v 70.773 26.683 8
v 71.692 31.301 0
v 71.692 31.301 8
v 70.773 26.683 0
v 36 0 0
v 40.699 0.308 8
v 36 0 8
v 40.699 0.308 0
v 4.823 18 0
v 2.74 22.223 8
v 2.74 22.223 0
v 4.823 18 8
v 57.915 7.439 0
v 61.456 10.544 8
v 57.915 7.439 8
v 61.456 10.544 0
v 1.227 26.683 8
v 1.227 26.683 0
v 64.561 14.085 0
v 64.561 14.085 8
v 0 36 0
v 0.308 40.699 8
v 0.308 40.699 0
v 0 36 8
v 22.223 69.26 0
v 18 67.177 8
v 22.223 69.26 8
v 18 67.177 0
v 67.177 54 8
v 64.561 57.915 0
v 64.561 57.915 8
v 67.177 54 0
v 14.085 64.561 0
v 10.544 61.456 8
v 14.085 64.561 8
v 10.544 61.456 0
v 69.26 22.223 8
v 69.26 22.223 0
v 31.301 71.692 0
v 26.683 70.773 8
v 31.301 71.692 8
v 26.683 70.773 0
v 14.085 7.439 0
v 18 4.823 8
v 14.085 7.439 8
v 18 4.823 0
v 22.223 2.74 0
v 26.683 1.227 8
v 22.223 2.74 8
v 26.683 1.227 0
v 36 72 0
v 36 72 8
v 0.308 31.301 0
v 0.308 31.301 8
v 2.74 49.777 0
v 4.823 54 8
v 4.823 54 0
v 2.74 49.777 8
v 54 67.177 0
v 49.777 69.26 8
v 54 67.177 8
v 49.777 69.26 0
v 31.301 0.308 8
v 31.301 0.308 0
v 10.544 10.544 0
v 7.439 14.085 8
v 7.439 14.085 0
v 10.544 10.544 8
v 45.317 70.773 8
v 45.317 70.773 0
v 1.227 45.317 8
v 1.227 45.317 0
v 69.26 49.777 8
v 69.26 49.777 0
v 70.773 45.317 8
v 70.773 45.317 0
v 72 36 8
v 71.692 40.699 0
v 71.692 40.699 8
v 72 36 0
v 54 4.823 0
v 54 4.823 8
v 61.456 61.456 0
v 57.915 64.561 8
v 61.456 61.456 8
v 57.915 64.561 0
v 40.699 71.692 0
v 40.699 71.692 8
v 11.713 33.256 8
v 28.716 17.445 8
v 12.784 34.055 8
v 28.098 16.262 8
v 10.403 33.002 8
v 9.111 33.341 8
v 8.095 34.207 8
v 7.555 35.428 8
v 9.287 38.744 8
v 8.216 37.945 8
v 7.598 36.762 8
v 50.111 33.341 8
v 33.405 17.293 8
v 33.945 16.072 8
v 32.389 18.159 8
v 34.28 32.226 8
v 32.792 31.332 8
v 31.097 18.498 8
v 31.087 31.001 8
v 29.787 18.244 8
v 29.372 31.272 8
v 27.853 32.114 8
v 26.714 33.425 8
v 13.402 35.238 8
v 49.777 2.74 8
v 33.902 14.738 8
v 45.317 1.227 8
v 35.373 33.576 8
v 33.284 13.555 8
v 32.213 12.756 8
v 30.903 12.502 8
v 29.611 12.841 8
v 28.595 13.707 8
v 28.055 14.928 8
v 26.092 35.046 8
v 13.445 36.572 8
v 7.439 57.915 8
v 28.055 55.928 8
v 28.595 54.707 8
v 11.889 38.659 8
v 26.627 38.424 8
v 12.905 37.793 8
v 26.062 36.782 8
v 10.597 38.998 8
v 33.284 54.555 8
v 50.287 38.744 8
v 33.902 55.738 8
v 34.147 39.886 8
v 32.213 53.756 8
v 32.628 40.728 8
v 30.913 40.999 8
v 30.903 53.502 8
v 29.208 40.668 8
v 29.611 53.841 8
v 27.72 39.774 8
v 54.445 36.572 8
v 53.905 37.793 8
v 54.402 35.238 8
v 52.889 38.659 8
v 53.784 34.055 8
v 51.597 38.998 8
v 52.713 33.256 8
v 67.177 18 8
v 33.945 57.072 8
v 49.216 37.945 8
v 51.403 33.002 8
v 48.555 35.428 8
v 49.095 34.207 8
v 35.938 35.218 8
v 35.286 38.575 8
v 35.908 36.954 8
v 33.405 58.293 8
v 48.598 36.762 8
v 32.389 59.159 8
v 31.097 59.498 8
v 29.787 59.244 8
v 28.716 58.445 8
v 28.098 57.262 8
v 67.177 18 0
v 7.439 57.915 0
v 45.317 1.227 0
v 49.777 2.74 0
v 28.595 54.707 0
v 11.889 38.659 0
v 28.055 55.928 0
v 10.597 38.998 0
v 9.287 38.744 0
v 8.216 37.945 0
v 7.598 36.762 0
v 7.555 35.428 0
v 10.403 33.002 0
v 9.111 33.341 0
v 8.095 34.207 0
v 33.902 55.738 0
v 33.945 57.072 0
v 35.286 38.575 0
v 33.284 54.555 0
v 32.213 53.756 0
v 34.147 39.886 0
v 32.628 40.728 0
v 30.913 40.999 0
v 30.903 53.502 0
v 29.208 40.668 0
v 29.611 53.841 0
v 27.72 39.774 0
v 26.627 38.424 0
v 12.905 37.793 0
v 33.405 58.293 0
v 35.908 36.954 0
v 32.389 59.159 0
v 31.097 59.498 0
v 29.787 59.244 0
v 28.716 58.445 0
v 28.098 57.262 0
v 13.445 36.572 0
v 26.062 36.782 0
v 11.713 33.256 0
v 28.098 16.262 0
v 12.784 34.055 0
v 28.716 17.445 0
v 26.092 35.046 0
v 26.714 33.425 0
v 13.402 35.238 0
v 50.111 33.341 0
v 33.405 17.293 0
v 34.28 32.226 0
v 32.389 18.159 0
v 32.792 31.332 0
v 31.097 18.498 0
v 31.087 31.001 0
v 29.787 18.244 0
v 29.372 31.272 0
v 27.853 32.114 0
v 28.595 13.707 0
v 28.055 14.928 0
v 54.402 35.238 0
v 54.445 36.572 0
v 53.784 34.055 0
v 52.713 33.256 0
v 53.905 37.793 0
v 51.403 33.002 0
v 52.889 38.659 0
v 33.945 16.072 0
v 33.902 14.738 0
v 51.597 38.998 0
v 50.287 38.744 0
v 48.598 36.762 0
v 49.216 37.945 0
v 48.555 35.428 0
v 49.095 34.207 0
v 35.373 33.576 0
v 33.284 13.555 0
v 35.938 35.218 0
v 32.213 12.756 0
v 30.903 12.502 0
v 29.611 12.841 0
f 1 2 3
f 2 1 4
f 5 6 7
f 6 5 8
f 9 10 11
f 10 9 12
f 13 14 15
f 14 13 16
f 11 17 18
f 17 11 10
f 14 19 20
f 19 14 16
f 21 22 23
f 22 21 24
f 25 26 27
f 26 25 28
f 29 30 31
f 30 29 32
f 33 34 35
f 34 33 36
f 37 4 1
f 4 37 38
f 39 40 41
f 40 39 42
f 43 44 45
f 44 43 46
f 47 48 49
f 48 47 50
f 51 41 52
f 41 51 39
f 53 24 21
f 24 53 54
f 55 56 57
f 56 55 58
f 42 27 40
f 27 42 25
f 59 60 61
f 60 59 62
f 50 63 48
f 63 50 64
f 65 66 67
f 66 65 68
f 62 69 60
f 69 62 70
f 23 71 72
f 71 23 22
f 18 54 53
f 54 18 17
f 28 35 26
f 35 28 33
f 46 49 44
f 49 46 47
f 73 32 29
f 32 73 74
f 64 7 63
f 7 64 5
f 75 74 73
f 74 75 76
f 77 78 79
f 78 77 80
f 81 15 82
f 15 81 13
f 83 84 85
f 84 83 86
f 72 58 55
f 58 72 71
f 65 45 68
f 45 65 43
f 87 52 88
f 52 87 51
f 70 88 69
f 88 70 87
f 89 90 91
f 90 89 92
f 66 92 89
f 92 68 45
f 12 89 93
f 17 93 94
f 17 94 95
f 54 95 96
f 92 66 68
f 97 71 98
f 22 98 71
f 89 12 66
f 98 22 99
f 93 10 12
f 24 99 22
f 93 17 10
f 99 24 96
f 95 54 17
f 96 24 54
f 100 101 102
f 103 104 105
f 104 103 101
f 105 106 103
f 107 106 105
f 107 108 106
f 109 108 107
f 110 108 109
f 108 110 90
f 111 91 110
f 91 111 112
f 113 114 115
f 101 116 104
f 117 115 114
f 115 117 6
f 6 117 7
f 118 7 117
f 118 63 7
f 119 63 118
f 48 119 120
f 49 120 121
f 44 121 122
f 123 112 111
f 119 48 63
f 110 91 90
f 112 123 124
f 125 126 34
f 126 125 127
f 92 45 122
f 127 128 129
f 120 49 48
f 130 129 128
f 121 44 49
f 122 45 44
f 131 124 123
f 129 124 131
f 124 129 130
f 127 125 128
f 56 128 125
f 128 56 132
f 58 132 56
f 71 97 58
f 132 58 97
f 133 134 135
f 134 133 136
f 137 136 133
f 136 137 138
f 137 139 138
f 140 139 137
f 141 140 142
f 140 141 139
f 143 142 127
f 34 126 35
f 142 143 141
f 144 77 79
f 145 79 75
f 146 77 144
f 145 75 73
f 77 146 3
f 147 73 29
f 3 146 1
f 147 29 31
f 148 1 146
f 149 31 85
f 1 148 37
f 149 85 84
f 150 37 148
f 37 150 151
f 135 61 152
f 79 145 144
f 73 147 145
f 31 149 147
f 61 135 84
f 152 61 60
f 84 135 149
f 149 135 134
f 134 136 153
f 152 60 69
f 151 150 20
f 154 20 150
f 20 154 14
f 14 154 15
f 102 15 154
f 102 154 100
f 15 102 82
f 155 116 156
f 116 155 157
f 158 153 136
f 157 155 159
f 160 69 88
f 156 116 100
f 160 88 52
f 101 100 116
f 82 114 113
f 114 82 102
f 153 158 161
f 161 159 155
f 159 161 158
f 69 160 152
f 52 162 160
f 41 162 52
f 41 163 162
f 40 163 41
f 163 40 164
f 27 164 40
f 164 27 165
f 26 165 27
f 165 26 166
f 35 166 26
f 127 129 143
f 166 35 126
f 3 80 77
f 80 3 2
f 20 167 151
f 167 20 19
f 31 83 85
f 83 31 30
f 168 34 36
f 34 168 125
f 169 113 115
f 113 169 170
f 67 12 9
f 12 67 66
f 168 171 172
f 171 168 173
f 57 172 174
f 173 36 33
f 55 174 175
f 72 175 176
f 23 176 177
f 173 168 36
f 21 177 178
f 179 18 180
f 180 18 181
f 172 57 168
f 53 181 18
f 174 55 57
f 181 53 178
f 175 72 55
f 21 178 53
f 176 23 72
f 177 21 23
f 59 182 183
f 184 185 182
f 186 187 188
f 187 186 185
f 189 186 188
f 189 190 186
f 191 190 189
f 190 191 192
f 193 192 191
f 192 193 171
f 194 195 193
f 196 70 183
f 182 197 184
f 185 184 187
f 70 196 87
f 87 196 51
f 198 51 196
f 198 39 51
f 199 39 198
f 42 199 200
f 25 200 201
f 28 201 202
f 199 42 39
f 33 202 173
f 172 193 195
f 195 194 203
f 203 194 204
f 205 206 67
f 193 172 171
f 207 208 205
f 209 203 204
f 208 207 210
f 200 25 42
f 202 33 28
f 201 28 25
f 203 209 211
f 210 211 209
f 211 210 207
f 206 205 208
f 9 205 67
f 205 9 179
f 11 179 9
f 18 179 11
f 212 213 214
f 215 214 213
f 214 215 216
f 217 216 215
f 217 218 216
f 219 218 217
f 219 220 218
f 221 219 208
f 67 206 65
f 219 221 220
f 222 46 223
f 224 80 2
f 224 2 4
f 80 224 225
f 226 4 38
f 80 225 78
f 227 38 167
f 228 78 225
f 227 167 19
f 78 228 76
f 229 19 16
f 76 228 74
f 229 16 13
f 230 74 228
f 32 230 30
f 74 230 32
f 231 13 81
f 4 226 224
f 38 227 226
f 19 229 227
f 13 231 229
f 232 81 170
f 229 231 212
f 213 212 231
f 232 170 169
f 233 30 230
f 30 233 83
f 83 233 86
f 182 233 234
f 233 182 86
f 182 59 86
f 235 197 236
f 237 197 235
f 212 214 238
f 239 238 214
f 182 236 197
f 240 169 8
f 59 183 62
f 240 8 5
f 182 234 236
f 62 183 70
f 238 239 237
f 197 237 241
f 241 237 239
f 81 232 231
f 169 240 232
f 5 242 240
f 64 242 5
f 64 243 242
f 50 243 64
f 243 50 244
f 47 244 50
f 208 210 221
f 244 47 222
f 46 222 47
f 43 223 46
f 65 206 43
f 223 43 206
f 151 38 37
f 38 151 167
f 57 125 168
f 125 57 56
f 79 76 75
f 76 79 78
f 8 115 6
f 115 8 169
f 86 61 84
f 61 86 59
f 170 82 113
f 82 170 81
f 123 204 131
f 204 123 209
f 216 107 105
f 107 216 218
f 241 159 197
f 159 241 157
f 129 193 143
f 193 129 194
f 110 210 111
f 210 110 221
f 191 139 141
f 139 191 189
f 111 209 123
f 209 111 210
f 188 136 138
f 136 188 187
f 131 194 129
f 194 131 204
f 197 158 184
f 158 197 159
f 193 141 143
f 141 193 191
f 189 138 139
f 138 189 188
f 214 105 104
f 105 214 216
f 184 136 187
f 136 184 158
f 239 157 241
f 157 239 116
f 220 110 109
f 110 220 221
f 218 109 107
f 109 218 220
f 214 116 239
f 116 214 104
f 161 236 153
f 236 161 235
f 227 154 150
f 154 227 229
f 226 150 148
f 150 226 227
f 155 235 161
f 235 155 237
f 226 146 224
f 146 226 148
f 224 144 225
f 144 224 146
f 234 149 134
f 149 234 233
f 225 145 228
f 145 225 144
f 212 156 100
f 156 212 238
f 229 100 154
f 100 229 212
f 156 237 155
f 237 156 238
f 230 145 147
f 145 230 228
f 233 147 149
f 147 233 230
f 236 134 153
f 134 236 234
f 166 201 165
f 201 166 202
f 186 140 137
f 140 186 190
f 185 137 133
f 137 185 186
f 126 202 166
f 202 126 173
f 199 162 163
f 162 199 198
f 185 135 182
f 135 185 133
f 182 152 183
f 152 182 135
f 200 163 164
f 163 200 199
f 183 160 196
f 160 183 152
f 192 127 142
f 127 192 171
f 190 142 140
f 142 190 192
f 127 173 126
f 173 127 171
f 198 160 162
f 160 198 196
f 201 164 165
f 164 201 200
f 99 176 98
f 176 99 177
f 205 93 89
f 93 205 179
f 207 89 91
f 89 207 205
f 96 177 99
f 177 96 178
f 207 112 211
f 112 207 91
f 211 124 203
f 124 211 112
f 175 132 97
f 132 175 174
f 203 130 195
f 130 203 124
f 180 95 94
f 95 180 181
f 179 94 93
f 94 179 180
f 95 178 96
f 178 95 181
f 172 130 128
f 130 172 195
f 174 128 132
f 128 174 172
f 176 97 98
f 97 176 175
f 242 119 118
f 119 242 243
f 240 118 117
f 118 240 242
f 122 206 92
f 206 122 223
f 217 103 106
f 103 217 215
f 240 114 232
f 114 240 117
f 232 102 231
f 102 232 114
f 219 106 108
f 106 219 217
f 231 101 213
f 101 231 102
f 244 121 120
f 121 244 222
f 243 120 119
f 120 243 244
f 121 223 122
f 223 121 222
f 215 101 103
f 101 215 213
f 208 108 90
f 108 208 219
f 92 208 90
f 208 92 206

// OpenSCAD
$fn = 32;

// ----------------------------------------------------------------------
// Cam plate: eccentric cam, base R36
// ----------------------------------------------------------------------

// --- parameters (mm) ---
base_r = 36;              // base circle radius
lobe_h = 10;              // cam lobe rise
bore_r = 5;               // shaft bore radius
plate_t = 8;              // plate thickness, Z (extrusion height)
ecc = 5;                  // disc eccentricity
ring_r = 20.5;            // lightening ring radius
bolt_r = 3;               // lightening hole radius

profile = [[72, 36], [71.692, 40.699], [70.773, 45.317], [69.26, 49.777], [67.177, 54], [64.561, 57.915], [61.456, 61.456], [57.915, 64.561], [54, 67.177], [49.777, 69.26], [45.317, 70.773], [40.699, 71.692], [36, 72], [31.301, 71.692], [26.683, 70.773], [22.223, 69.26], [18, 67.177], [14.085, 64.561], [10.544, 61.456], [7.439, 57.915], [4.823, 54], [2.74, 49.777], [1.227, 45.317], [0.308, 40.699], [0, 36], [0.308, 31.301], [1.227, 26.683], [2.74, 22.223], [4.823, 18], [7.439, 14.085], [10.544, 10.544], [14.085, 7.439], [18, 4.823], [22.223, 2.74], [26.683, 1.227], [31.301, 0.308], [36, 0], [40.699, 0.308], [45.317, 1.227], [49.777, 2.74], [54, 4.823], [57.915, 7.439], [61.456, 10.544], [64.561, 14.085], [67.177, 18], [69.26, 22.223], [70.773, 26.683], [71.692, 31.301]];  // primary outline, 48 points, counter clockwise
void_1 = [[35.908, 36.954], [35.286, 38.575], [34.147, 39.886], [32.628, 40.728], [30.913, 40.999], [29.208, 40.668], [27.72, 39.774], [26.627, 38.424], [26.062, 36.782], [26.092, 35.046], [26.714, 33.425], [27.853, 32.114], [29.372, 31.272], [31.087, 31.001], [32.792, 31.332], [34.28, 32.226], [35.373, 33.576], [35.938, 35.218]];  // shaft bore, 18 points
void_2 = [[54.445, 36.572], [53.905, 37.793], [52.889, 38.659], [51.597, 38.998], [50.287, 38.744], [49.216, 37.945], [48.598, 36.762], [48.555, 35.428], [49.095, 34.207], [50.111, 33.341], [51.403, 33.002], [52.713, 33.256], [53.784, 34.055], [54.402, 35.238]];  // lightening hole 1, 14 points
void_3 = [[33.945, 57.072], [33.405, 58.293], [32.389, 59.159], [31.097, 59.498], [29.787, 59.244], [28.716, 58.445], [28.098, 57.262], [28.055, 55.928], [28.595, 54.707], [29.611, 53.841], [30.903, 53.502], [32.213, 53.756], [33.284, 54.555], [33.902, 55.738]];  // lightening hole 2, 14 points
void_4 = [[13.445, 36.572], [12.905, 37.793], [11.889, 38.659], [10.597, 38.998], [9.287, 38.744], [8.216, 37.945], [7.598, 36.762], [7.555, 35.428], [8.095, 34.207], [9.111, 33.341], [10.403, 33.002], [11.713, 33.256], [12.784, 34.055], [13.402, 35.238]];  // lightening hole 3, 14 points
void_5 = [[33.945, 16.072], [33.405, 17.293], [32.389, 18.159], [31.097, 18.498], [29.787, 18.244], [28.716, 17.445], [28.098, 16.262], [28.055, 14.928], [28.595, 13.707], [29.611, 12.841], [30.903, 12.502], [32.213, 12.756], [33.284, 13.555], [33.902, 14.738]];  // lightening hole 4, 14 points

// --- the one profile operation ---
difference() {
  linear_extrude(height = plate_t) polygon(points = profile);
  translate([0, 0, -1])
    linear_extrude(height = plate_t + 2) polygon(points = void_1);
  translate([0, 0, -1])
    linear_extrude(height = plate_t + 2) polygon(points = void_2);
  translate([0, 0, -1])
    linear_extrude(height = plate_t + 2) polygon(points = void_3);
  translate([0, 0, -1])
    linear_extrude(height = plate_t + 2) polygon(points = void_4);
  translate([0, 0, -1])
    linear_extrude(height = plate_t + 2) polygon(points = void_5);
}
